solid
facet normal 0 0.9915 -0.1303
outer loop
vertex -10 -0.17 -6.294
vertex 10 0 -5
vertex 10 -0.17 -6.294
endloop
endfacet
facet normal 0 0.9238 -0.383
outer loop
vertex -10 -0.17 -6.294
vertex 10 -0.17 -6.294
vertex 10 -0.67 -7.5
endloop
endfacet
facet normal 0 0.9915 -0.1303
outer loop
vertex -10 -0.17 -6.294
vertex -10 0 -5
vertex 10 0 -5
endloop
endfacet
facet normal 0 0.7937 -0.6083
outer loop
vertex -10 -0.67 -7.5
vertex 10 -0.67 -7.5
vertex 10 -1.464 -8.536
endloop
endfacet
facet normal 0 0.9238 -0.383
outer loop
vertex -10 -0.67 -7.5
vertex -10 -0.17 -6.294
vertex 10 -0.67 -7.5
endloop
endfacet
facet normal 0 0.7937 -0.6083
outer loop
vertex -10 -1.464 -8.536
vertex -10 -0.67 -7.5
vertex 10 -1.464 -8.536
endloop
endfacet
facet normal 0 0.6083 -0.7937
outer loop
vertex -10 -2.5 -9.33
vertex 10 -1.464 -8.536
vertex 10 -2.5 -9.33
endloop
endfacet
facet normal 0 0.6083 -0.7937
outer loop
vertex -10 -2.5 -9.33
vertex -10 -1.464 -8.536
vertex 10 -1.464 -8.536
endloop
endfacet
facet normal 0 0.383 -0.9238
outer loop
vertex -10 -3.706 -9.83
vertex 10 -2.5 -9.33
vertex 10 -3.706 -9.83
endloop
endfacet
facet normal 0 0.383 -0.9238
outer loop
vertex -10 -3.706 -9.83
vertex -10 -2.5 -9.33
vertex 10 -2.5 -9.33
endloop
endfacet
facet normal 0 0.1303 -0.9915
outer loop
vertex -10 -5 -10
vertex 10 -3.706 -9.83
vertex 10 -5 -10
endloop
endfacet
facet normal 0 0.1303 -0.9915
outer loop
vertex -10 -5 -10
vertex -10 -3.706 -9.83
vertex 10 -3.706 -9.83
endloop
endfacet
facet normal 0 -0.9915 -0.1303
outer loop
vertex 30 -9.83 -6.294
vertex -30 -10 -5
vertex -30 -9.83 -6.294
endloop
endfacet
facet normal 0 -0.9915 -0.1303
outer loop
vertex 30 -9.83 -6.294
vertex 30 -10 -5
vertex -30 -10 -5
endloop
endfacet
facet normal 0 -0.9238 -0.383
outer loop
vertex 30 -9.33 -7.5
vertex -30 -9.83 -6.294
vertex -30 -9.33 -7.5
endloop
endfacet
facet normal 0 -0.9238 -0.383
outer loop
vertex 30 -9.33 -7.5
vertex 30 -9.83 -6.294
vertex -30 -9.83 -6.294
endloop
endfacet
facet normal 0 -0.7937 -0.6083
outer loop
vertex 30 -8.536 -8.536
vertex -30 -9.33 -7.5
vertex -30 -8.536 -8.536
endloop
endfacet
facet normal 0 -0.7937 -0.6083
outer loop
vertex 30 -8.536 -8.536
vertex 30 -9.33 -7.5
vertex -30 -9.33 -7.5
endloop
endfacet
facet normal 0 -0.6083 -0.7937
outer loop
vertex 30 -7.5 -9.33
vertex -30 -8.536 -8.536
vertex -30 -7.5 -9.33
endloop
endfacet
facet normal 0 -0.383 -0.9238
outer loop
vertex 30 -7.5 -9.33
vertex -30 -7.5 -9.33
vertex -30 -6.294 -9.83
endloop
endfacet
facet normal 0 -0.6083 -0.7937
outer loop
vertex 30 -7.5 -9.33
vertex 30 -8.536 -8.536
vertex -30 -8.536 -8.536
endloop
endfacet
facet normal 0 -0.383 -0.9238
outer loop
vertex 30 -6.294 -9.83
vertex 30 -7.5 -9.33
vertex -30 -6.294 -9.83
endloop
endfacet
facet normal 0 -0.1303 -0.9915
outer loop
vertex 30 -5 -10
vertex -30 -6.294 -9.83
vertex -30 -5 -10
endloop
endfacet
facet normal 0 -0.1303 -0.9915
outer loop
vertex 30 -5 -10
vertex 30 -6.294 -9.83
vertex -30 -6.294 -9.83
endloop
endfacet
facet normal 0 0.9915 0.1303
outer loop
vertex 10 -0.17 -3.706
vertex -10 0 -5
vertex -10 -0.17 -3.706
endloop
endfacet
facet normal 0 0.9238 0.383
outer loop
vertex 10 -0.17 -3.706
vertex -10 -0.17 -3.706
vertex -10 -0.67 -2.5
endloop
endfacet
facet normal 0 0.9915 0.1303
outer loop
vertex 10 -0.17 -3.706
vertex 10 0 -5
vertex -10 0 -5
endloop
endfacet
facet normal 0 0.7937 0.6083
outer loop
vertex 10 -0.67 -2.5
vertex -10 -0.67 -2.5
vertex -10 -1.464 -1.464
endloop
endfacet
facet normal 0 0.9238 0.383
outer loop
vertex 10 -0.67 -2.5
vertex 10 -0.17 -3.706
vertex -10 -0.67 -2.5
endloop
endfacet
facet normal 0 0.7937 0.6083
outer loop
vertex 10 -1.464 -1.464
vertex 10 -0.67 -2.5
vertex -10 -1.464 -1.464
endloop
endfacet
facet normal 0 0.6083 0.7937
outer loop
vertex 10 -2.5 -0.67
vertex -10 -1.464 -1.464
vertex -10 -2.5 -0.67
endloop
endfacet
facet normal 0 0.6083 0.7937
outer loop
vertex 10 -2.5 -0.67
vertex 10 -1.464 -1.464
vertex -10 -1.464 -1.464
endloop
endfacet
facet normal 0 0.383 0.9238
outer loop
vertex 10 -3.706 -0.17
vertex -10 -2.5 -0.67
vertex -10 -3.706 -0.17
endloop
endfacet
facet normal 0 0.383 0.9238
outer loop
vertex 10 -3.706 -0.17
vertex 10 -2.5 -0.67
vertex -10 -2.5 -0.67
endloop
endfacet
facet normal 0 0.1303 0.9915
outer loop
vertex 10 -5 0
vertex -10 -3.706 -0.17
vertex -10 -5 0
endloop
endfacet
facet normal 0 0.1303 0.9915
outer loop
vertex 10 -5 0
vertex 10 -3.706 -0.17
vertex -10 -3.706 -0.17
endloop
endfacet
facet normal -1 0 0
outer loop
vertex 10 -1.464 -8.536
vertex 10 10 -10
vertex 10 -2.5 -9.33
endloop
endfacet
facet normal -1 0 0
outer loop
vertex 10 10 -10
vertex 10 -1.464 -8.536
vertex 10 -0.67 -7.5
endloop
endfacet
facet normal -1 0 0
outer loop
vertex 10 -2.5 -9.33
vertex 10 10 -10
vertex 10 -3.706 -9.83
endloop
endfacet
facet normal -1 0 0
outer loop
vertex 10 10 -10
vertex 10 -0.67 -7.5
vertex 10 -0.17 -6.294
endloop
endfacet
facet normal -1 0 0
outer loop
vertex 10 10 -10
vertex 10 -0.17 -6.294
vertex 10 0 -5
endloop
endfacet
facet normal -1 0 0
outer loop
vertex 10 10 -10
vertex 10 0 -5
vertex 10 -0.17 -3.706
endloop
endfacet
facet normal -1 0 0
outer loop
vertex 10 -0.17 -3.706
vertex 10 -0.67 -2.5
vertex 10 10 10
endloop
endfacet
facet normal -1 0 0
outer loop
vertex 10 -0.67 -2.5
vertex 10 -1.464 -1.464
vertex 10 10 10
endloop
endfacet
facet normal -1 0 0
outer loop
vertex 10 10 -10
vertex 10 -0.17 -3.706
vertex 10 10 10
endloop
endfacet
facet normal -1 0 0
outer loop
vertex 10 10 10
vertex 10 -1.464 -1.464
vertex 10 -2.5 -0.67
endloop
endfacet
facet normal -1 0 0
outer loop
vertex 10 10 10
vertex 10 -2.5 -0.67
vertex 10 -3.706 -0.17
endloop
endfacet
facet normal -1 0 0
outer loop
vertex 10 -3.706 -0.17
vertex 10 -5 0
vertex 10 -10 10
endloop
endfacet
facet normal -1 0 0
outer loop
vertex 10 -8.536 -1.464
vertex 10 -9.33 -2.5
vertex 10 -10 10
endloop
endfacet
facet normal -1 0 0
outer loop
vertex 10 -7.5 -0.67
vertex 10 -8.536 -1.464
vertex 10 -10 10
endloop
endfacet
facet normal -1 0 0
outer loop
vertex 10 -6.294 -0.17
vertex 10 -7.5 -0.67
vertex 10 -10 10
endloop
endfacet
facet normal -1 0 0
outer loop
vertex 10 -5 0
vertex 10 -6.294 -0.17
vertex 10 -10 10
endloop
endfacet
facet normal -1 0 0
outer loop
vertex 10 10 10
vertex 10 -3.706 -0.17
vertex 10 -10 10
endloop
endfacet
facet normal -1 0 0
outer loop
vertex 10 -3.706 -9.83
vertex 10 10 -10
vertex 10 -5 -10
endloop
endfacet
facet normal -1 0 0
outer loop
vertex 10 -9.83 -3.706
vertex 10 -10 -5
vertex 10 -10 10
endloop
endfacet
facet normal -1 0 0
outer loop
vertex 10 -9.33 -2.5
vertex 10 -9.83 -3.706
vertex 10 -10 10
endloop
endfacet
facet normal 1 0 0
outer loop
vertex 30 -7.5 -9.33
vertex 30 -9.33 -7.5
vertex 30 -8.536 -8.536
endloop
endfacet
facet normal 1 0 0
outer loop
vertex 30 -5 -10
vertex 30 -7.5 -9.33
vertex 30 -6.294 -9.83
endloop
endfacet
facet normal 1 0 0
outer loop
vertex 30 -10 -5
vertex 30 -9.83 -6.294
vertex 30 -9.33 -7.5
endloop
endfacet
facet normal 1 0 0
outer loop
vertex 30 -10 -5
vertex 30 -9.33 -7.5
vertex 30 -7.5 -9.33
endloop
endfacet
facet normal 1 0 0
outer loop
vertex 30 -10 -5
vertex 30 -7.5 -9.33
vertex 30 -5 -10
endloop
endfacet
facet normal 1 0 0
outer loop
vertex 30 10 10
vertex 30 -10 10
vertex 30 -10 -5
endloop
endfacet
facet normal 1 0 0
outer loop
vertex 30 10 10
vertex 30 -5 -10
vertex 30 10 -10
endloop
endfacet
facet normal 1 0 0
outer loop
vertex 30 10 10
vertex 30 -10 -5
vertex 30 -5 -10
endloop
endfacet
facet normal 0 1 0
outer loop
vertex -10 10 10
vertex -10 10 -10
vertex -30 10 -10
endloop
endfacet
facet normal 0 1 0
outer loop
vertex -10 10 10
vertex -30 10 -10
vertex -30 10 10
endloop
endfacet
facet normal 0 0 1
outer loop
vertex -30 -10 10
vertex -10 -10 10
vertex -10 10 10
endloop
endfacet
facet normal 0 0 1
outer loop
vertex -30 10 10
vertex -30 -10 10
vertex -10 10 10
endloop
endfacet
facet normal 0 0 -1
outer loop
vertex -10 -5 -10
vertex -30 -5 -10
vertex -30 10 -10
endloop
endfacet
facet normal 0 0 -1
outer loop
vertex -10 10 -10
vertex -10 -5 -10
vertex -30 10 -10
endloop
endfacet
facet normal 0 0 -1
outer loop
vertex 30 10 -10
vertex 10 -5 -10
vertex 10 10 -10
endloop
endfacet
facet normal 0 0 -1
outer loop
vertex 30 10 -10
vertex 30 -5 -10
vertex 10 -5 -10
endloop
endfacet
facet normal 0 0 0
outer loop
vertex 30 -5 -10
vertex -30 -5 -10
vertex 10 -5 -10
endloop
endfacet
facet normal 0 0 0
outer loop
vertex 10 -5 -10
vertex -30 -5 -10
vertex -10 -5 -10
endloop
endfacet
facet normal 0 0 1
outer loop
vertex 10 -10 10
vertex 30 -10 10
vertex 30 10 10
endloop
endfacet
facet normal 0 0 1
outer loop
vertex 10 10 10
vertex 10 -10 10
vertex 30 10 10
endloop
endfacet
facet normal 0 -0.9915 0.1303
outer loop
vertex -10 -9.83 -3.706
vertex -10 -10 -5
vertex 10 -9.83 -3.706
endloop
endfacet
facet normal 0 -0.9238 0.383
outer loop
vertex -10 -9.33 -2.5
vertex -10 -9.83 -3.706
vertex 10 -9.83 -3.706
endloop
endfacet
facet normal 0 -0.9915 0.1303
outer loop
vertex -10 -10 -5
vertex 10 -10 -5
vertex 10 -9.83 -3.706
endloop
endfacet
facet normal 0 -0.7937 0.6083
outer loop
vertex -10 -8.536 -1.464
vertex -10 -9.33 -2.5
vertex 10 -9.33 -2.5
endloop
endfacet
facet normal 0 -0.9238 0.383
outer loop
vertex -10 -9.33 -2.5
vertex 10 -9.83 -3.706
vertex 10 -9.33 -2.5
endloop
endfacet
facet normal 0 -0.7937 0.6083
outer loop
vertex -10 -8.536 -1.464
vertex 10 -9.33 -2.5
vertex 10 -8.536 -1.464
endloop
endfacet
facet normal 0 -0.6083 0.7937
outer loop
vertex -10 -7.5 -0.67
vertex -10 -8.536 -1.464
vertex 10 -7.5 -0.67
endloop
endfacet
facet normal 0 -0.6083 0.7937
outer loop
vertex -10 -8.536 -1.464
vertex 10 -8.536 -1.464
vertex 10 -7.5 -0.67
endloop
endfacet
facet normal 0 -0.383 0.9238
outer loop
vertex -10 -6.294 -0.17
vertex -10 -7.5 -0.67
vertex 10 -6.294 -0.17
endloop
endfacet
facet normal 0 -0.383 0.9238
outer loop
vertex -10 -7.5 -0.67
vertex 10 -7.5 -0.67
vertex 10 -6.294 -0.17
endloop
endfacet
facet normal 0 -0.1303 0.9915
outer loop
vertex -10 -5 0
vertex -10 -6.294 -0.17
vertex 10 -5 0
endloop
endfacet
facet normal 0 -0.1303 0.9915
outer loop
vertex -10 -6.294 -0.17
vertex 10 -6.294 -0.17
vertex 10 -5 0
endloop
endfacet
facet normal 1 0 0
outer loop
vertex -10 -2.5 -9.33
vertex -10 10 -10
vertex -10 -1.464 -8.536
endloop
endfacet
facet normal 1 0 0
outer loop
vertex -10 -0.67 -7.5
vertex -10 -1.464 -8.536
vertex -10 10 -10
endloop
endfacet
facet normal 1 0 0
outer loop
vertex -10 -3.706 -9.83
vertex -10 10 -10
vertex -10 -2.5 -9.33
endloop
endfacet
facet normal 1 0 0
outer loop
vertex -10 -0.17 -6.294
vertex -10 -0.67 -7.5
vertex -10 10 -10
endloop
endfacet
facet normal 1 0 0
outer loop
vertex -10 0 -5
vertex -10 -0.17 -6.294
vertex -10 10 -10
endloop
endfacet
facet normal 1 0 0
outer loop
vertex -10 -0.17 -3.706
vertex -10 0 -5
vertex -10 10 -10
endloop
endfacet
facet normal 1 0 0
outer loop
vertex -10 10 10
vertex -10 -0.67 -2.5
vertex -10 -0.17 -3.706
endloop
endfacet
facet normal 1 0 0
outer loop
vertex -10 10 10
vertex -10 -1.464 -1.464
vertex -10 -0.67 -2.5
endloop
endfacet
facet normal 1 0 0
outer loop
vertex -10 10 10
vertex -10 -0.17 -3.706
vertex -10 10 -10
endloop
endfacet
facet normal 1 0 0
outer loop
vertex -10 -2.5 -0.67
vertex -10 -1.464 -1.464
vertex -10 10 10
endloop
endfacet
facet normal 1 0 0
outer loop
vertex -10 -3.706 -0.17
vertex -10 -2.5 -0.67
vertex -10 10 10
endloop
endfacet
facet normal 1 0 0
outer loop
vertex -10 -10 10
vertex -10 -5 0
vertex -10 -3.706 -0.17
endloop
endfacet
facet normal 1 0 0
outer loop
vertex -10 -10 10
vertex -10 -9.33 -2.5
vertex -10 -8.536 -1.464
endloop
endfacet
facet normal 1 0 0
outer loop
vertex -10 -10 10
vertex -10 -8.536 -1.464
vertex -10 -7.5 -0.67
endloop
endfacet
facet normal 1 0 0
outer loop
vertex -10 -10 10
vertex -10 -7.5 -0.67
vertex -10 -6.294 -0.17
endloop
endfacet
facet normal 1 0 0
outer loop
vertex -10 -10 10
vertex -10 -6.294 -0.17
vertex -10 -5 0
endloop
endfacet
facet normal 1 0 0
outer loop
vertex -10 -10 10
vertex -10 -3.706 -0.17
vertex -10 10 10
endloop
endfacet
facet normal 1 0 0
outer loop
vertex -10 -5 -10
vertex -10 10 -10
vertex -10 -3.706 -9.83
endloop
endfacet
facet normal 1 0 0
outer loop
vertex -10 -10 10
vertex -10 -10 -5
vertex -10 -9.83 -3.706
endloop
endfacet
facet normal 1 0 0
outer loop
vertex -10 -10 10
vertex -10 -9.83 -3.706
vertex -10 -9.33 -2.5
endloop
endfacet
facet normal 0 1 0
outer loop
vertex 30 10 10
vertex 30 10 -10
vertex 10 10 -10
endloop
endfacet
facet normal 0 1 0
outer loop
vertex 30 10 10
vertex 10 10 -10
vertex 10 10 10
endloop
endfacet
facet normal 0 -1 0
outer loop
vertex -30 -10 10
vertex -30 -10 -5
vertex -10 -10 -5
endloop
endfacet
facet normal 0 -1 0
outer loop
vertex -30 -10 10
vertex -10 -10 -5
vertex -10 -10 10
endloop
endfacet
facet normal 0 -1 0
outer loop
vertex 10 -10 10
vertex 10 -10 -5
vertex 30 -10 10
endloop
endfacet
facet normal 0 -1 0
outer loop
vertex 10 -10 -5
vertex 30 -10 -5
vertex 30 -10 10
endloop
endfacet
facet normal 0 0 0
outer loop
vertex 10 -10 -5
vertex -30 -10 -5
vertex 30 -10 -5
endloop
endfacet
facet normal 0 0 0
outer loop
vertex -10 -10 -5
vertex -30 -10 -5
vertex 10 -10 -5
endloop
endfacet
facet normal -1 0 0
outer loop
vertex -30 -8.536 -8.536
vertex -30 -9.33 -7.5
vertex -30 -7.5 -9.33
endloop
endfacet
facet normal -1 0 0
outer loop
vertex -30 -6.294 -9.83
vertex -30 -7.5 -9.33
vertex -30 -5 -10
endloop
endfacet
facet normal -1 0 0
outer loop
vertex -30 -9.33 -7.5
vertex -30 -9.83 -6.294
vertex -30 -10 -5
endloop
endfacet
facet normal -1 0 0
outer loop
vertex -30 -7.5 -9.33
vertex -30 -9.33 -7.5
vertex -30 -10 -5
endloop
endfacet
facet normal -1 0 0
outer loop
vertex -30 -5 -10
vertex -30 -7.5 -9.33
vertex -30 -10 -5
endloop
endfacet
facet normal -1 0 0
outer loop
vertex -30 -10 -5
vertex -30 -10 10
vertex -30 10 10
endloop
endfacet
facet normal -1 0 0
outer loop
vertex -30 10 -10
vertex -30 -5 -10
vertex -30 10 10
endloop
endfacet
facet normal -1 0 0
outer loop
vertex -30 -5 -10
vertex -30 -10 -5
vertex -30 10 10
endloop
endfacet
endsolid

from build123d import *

# Parameters (mm, degrees)
F0_W     = 20
F0_H     = 20
F1_DEPTH = 30
F2_W     = 20
F2_H     = 10
F3_DEPTH = 20
F4_W     = 20
F4_H     = 10
F5_DEPTH = 25
F6_R     = 4.99999


# Not quite as in the source:
# - a fillet or chamfer is up to 0.001 mm smaller than in the source, because OpenCascade refuses the exact size


with BuildPart() as f1:
    # F0 (on Right) → F1 (new body, symmetric)
    with BuildSketch(Plane.YZ):
        Rectangle(F0_W, F0_H)
    extrude(amount=F1_DEPTH, both=True)

    # F2 (on face) → F3 (cut)
    with BuildSketch(Plane.XZ.offset(10)):
        with Locations((0, 5)):
            Rectangle(F2_W, F2_H)
    extrude(amount=-F3_DEPTH, mode=Mode.SUBTRACT)

    # F4 (on face) → F5 (cut)
    with BuildSketch(Plane.XY):
        with Locations((0, 5)):
            Rectangle(F4_W, F4_H)
    extrude(amount=-F5_DEPTH, mode=Mode.SUBTRACT)

    # F6 (radius 5 in the source; OpenCascade refuses exactly that, so slightly less here)
    f6_edges = [f1.edges().sort_by_distance(p)[0] for p in [
        (0, 0, 0),
        (0, 0, -10),
        (0, -10, 0),
        (0, -10, -10),
    ]]
    fillet(f6_edges, radius=F6_R)


solid = f1.part
